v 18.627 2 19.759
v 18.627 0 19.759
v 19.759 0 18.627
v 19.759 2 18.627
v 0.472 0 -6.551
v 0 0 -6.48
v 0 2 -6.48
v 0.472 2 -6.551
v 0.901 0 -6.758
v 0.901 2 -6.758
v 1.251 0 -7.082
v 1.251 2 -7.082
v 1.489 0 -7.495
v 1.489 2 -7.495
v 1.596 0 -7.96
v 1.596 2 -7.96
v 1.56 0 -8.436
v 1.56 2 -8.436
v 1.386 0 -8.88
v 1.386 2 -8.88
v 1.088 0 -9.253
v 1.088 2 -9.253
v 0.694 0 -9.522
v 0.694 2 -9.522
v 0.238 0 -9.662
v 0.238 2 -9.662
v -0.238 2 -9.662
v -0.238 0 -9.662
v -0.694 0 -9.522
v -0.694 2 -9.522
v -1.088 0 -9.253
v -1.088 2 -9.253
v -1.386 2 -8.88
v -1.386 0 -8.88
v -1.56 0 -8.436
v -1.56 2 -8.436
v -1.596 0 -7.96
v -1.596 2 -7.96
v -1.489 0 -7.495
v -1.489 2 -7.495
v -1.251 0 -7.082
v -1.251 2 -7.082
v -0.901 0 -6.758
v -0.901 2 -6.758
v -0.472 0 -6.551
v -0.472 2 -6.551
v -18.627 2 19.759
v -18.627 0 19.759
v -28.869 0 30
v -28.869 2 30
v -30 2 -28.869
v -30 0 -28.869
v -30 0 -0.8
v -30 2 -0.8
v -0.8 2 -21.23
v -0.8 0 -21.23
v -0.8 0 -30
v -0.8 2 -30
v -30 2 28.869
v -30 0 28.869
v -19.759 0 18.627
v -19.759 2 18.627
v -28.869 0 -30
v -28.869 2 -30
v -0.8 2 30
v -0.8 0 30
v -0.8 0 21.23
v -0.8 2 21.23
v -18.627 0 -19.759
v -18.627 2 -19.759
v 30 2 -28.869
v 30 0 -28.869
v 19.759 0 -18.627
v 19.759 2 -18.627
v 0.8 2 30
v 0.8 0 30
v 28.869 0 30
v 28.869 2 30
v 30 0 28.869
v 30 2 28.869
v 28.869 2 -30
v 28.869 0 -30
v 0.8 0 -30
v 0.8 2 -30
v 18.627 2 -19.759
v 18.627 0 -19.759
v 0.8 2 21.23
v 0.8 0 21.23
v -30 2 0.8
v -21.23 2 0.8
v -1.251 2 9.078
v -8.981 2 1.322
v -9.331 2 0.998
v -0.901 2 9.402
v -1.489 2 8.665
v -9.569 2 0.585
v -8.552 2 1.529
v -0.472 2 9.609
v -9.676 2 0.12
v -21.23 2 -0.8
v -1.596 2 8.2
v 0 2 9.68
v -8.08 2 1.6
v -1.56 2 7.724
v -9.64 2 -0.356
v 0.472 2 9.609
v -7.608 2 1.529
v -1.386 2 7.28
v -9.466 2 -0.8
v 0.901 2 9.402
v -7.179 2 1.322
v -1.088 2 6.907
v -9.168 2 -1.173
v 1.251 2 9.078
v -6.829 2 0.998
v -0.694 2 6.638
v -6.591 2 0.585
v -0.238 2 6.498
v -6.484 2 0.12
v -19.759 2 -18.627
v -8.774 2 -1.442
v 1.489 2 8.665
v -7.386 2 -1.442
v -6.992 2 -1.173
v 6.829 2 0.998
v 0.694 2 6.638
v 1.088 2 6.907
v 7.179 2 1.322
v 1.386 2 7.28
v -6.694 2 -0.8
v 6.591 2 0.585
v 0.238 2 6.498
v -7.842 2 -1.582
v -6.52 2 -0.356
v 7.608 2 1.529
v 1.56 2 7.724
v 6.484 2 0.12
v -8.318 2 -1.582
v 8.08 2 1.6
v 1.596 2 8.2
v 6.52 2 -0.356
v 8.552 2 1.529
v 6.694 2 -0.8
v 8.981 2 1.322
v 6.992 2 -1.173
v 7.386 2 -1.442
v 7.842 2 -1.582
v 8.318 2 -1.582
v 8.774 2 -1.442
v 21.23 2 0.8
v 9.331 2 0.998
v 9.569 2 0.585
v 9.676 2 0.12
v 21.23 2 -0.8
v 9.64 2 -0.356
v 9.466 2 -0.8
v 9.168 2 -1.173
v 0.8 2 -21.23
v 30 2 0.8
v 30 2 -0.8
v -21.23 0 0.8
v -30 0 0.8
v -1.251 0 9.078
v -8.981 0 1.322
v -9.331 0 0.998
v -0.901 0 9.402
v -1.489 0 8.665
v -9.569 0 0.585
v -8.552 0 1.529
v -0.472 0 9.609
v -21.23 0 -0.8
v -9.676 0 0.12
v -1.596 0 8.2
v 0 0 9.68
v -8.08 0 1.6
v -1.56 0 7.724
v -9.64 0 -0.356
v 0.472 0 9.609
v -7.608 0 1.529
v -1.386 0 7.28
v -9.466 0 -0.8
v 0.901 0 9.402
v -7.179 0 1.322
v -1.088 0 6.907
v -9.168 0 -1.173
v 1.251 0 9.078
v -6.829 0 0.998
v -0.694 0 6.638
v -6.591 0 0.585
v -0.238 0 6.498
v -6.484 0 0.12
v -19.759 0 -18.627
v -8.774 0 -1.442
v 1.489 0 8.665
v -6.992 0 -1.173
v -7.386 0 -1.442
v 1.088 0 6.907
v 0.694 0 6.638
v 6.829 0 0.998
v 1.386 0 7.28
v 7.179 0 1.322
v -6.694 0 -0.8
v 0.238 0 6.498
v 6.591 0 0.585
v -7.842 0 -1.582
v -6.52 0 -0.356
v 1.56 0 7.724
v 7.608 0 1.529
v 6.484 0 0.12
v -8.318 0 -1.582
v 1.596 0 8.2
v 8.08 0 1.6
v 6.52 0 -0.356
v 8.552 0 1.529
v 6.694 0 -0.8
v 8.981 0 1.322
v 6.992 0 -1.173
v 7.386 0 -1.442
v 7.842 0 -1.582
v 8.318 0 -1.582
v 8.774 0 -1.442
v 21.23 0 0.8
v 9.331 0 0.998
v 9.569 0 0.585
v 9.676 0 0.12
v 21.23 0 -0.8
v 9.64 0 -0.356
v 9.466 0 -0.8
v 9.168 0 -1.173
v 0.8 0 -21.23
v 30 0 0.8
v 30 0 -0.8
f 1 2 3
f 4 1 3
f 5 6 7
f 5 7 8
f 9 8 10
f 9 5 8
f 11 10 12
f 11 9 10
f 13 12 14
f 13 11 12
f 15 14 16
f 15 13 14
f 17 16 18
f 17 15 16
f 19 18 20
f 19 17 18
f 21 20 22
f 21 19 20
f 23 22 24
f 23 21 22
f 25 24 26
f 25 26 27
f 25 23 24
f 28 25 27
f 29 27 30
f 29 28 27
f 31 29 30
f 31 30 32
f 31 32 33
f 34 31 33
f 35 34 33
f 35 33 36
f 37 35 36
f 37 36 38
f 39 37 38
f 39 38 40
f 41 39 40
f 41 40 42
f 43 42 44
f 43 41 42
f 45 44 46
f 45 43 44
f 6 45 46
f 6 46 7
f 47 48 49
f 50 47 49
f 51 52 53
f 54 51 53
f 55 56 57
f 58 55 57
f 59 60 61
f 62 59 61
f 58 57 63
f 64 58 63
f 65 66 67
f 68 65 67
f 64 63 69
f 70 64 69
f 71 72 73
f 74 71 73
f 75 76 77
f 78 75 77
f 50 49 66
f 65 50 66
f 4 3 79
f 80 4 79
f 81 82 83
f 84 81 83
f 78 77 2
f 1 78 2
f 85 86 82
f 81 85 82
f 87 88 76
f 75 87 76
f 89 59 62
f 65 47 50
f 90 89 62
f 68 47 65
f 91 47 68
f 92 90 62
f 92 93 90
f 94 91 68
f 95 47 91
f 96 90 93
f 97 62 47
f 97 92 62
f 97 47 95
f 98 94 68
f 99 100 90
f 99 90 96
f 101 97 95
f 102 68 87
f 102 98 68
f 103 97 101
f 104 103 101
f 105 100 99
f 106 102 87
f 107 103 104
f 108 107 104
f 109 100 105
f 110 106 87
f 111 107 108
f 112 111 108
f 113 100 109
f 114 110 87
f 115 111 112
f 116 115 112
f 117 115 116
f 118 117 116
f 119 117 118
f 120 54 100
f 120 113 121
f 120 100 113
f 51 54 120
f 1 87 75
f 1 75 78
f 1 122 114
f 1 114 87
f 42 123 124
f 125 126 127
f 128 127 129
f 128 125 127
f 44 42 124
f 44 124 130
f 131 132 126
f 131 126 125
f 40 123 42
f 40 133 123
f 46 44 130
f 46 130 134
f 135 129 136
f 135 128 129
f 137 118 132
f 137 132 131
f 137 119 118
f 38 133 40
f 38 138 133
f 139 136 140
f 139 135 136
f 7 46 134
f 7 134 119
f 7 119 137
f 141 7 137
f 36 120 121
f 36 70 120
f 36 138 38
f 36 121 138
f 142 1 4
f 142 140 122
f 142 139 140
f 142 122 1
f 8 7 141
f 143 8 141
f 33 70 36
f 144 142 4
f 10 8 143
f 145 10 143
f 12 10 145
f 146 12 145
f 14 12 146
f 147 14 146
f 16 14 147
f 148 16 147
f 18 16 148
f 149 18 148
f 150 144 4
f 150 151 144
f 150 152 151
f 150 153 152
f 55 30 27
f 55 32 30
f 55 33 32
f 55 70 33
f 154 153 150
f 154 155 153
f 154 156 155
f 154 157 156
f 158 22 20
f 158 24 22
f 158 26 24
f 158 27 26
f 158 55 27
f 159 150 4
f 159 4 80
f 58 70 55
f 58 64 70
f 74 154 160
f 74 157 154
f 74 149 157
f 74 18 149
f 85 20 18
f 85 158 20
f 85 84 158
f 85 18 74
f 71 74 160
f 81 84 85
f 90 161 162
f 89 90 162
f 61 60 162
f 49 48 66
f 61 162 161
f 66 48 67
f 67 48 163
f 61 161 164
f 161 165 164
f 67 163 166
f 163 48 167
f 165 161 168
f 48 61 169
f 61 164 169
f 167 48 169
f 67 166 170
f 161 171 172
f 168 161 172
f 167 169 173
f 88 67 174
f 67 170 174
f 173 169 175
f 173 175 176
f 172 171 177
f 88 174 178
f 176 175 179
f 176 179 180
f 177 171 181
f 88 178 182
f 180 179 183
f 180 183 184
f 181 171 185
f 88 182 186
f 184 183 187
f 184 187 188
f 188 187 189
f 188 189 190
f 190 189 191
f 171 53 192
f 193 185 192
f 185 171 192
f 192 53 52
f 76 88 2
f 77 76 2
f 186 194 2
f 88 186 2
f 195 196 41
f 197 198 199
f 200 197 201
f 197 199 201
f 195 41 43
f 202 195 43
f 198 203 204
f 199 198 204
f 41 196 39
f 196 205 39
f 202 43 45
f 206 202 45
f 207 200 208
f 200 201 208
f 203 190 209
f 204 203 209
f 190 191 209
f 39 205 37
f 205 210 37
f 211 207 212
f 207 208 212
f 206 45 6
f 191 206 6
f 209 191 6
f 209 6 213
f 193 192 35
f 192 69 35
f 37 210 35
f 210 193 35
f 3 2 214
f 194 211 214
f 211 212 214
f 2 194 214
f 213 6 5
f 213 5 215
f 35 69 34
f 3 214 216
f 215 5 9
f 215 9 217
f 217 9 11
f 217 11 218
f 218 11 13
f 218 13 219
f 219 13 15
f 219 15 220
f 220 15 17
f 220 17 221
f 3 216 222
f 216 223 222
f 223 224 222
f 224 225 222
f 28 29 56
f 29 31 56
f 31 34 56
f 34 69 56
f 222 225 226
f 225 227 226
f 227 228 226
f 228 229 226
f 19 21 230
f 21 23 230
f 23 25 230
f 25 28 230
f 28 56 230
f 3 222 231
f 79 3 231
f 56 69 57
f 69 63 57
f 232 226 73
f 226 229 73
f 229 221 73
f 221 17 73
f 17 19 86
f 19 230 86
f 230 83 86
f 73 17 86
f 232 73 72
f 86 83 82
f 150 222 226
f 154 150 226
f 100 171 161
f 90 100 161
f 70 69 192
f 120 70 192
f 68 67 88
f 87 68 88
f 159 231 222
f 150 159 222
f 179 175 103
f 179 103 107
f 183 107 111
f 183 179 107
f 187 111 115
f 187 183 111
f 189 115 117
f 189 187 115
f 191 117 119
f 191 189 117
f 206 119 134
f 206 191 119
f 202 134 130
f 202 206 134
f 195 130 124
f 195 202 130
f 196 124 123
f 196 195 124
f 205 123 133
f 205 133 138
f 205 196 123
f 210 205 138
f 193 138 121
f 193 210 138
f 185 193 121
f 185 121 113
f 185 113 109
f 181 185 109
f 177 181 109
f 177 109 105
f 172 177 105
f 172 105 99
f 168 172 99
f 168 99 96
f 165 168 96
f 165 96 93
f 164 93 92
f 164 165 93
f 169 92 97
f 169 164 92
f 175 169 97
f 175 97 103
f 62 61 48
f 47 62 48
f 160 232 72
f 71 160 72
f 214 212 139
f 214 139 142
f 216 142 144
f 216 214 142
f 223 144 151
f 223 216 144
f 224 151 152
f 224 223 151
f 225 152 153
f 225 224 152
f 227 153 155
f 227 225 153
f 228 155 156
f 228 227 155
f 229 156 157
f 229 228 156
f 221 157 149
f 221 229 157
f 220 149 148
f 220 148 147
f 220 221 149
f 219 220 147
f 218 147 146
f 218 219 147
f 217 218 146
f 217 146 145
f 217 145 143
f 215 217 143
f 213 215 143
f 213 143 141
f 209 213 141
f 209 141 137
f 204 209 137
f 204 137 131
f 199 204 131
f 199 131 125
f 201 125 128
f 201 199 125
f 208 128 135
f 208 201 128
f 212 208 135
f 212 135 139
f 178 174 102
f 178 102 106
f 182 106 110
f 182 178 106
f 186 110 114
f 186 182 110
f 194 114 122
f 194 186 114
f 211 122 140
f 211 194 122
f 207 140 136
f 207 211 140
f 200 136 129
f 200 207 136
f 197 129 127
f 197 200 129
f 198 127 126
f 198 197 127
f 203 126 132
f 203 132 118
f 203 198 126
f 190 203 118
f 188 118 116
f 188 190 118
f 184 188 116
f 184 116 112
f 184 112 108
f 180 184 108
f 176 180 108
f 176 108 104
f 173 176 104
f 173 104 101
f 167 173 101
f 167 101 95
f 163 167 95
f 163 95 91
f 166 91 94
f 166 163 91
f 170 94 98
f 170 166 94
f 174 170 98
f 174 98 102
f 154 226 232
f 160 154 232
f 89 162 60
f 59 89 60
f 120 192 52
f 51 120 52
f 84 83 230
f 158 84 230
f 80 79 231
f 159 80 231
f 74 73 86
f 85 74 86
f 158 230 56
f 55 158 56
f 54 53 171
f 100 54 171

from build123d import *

# Parameters (mm, degrees)
SKETCH_1_R      = 1.6
EXTRUDE_1_DEPTH = 2


with BuildPart() as part:
    # 草图1 → 凸台-拉伸1 (new body)
    with BuildSketch(Plane(origin=(0, 0, 0), x_dir=(1, 0, 0), z_dir=(0, 1, 0))):
        Polygon((-30, 28.86862915), (-30, 0.8), (-21.23, 0.8), (-21.23, -0.8), (-30, -0.8), (-30, -28.86862915), (-19.758831067, -18.627460217), (-18.627460217, -19.758831067), (-28.86862915, -30), (-0.8, -30), (-0.8, -21.23), (0.8, -21.23), (0.8, -30), (28.86862915, -30), (18.627460217, -19.758831067), (19.758831067, -18.627460217), (30, -28.86862915), (30, -0.8), (21.23, -0.8), (21.23, 0.8), (30, 0.8), (30, 28.86862915), (19.758831067, 18.627460217), (18.627460217, 19.758831067), (28.86862915, 30), (0.8, 30), (0.8, 21.23), (-0.8, 21.23), (-0.8, 30), (-28.86862915, 30), (-18.627460217, 19.758831067), (-19.758831067, 18.627460217), align=None)
        with Locations(Location((0, -8.08, 0), (0, 0, 270))):
            Circle(SKETCH_1_R, mode=Mode.SUBTRACT)
        with Locations(Location((-8.08, 0, 0), (0, 0, 270))):
            Circle(SKETCH_1_R, mode=Mode.SUBTRACT)
        with Locations(Location((8.08, 0, 0), (0, 0, 270))):
            Circle(SKETCH_1_R, mode=Mode.SUBTRACT)
        with Locations(Location((0, 8.08, 0), (0, 0, 270))):
            Circle(SKETCH_1_R, mode=Mode.SUBTRACT)
    extrude(amount=EXTRUDE_1_DEPTH)


solid = part.part
